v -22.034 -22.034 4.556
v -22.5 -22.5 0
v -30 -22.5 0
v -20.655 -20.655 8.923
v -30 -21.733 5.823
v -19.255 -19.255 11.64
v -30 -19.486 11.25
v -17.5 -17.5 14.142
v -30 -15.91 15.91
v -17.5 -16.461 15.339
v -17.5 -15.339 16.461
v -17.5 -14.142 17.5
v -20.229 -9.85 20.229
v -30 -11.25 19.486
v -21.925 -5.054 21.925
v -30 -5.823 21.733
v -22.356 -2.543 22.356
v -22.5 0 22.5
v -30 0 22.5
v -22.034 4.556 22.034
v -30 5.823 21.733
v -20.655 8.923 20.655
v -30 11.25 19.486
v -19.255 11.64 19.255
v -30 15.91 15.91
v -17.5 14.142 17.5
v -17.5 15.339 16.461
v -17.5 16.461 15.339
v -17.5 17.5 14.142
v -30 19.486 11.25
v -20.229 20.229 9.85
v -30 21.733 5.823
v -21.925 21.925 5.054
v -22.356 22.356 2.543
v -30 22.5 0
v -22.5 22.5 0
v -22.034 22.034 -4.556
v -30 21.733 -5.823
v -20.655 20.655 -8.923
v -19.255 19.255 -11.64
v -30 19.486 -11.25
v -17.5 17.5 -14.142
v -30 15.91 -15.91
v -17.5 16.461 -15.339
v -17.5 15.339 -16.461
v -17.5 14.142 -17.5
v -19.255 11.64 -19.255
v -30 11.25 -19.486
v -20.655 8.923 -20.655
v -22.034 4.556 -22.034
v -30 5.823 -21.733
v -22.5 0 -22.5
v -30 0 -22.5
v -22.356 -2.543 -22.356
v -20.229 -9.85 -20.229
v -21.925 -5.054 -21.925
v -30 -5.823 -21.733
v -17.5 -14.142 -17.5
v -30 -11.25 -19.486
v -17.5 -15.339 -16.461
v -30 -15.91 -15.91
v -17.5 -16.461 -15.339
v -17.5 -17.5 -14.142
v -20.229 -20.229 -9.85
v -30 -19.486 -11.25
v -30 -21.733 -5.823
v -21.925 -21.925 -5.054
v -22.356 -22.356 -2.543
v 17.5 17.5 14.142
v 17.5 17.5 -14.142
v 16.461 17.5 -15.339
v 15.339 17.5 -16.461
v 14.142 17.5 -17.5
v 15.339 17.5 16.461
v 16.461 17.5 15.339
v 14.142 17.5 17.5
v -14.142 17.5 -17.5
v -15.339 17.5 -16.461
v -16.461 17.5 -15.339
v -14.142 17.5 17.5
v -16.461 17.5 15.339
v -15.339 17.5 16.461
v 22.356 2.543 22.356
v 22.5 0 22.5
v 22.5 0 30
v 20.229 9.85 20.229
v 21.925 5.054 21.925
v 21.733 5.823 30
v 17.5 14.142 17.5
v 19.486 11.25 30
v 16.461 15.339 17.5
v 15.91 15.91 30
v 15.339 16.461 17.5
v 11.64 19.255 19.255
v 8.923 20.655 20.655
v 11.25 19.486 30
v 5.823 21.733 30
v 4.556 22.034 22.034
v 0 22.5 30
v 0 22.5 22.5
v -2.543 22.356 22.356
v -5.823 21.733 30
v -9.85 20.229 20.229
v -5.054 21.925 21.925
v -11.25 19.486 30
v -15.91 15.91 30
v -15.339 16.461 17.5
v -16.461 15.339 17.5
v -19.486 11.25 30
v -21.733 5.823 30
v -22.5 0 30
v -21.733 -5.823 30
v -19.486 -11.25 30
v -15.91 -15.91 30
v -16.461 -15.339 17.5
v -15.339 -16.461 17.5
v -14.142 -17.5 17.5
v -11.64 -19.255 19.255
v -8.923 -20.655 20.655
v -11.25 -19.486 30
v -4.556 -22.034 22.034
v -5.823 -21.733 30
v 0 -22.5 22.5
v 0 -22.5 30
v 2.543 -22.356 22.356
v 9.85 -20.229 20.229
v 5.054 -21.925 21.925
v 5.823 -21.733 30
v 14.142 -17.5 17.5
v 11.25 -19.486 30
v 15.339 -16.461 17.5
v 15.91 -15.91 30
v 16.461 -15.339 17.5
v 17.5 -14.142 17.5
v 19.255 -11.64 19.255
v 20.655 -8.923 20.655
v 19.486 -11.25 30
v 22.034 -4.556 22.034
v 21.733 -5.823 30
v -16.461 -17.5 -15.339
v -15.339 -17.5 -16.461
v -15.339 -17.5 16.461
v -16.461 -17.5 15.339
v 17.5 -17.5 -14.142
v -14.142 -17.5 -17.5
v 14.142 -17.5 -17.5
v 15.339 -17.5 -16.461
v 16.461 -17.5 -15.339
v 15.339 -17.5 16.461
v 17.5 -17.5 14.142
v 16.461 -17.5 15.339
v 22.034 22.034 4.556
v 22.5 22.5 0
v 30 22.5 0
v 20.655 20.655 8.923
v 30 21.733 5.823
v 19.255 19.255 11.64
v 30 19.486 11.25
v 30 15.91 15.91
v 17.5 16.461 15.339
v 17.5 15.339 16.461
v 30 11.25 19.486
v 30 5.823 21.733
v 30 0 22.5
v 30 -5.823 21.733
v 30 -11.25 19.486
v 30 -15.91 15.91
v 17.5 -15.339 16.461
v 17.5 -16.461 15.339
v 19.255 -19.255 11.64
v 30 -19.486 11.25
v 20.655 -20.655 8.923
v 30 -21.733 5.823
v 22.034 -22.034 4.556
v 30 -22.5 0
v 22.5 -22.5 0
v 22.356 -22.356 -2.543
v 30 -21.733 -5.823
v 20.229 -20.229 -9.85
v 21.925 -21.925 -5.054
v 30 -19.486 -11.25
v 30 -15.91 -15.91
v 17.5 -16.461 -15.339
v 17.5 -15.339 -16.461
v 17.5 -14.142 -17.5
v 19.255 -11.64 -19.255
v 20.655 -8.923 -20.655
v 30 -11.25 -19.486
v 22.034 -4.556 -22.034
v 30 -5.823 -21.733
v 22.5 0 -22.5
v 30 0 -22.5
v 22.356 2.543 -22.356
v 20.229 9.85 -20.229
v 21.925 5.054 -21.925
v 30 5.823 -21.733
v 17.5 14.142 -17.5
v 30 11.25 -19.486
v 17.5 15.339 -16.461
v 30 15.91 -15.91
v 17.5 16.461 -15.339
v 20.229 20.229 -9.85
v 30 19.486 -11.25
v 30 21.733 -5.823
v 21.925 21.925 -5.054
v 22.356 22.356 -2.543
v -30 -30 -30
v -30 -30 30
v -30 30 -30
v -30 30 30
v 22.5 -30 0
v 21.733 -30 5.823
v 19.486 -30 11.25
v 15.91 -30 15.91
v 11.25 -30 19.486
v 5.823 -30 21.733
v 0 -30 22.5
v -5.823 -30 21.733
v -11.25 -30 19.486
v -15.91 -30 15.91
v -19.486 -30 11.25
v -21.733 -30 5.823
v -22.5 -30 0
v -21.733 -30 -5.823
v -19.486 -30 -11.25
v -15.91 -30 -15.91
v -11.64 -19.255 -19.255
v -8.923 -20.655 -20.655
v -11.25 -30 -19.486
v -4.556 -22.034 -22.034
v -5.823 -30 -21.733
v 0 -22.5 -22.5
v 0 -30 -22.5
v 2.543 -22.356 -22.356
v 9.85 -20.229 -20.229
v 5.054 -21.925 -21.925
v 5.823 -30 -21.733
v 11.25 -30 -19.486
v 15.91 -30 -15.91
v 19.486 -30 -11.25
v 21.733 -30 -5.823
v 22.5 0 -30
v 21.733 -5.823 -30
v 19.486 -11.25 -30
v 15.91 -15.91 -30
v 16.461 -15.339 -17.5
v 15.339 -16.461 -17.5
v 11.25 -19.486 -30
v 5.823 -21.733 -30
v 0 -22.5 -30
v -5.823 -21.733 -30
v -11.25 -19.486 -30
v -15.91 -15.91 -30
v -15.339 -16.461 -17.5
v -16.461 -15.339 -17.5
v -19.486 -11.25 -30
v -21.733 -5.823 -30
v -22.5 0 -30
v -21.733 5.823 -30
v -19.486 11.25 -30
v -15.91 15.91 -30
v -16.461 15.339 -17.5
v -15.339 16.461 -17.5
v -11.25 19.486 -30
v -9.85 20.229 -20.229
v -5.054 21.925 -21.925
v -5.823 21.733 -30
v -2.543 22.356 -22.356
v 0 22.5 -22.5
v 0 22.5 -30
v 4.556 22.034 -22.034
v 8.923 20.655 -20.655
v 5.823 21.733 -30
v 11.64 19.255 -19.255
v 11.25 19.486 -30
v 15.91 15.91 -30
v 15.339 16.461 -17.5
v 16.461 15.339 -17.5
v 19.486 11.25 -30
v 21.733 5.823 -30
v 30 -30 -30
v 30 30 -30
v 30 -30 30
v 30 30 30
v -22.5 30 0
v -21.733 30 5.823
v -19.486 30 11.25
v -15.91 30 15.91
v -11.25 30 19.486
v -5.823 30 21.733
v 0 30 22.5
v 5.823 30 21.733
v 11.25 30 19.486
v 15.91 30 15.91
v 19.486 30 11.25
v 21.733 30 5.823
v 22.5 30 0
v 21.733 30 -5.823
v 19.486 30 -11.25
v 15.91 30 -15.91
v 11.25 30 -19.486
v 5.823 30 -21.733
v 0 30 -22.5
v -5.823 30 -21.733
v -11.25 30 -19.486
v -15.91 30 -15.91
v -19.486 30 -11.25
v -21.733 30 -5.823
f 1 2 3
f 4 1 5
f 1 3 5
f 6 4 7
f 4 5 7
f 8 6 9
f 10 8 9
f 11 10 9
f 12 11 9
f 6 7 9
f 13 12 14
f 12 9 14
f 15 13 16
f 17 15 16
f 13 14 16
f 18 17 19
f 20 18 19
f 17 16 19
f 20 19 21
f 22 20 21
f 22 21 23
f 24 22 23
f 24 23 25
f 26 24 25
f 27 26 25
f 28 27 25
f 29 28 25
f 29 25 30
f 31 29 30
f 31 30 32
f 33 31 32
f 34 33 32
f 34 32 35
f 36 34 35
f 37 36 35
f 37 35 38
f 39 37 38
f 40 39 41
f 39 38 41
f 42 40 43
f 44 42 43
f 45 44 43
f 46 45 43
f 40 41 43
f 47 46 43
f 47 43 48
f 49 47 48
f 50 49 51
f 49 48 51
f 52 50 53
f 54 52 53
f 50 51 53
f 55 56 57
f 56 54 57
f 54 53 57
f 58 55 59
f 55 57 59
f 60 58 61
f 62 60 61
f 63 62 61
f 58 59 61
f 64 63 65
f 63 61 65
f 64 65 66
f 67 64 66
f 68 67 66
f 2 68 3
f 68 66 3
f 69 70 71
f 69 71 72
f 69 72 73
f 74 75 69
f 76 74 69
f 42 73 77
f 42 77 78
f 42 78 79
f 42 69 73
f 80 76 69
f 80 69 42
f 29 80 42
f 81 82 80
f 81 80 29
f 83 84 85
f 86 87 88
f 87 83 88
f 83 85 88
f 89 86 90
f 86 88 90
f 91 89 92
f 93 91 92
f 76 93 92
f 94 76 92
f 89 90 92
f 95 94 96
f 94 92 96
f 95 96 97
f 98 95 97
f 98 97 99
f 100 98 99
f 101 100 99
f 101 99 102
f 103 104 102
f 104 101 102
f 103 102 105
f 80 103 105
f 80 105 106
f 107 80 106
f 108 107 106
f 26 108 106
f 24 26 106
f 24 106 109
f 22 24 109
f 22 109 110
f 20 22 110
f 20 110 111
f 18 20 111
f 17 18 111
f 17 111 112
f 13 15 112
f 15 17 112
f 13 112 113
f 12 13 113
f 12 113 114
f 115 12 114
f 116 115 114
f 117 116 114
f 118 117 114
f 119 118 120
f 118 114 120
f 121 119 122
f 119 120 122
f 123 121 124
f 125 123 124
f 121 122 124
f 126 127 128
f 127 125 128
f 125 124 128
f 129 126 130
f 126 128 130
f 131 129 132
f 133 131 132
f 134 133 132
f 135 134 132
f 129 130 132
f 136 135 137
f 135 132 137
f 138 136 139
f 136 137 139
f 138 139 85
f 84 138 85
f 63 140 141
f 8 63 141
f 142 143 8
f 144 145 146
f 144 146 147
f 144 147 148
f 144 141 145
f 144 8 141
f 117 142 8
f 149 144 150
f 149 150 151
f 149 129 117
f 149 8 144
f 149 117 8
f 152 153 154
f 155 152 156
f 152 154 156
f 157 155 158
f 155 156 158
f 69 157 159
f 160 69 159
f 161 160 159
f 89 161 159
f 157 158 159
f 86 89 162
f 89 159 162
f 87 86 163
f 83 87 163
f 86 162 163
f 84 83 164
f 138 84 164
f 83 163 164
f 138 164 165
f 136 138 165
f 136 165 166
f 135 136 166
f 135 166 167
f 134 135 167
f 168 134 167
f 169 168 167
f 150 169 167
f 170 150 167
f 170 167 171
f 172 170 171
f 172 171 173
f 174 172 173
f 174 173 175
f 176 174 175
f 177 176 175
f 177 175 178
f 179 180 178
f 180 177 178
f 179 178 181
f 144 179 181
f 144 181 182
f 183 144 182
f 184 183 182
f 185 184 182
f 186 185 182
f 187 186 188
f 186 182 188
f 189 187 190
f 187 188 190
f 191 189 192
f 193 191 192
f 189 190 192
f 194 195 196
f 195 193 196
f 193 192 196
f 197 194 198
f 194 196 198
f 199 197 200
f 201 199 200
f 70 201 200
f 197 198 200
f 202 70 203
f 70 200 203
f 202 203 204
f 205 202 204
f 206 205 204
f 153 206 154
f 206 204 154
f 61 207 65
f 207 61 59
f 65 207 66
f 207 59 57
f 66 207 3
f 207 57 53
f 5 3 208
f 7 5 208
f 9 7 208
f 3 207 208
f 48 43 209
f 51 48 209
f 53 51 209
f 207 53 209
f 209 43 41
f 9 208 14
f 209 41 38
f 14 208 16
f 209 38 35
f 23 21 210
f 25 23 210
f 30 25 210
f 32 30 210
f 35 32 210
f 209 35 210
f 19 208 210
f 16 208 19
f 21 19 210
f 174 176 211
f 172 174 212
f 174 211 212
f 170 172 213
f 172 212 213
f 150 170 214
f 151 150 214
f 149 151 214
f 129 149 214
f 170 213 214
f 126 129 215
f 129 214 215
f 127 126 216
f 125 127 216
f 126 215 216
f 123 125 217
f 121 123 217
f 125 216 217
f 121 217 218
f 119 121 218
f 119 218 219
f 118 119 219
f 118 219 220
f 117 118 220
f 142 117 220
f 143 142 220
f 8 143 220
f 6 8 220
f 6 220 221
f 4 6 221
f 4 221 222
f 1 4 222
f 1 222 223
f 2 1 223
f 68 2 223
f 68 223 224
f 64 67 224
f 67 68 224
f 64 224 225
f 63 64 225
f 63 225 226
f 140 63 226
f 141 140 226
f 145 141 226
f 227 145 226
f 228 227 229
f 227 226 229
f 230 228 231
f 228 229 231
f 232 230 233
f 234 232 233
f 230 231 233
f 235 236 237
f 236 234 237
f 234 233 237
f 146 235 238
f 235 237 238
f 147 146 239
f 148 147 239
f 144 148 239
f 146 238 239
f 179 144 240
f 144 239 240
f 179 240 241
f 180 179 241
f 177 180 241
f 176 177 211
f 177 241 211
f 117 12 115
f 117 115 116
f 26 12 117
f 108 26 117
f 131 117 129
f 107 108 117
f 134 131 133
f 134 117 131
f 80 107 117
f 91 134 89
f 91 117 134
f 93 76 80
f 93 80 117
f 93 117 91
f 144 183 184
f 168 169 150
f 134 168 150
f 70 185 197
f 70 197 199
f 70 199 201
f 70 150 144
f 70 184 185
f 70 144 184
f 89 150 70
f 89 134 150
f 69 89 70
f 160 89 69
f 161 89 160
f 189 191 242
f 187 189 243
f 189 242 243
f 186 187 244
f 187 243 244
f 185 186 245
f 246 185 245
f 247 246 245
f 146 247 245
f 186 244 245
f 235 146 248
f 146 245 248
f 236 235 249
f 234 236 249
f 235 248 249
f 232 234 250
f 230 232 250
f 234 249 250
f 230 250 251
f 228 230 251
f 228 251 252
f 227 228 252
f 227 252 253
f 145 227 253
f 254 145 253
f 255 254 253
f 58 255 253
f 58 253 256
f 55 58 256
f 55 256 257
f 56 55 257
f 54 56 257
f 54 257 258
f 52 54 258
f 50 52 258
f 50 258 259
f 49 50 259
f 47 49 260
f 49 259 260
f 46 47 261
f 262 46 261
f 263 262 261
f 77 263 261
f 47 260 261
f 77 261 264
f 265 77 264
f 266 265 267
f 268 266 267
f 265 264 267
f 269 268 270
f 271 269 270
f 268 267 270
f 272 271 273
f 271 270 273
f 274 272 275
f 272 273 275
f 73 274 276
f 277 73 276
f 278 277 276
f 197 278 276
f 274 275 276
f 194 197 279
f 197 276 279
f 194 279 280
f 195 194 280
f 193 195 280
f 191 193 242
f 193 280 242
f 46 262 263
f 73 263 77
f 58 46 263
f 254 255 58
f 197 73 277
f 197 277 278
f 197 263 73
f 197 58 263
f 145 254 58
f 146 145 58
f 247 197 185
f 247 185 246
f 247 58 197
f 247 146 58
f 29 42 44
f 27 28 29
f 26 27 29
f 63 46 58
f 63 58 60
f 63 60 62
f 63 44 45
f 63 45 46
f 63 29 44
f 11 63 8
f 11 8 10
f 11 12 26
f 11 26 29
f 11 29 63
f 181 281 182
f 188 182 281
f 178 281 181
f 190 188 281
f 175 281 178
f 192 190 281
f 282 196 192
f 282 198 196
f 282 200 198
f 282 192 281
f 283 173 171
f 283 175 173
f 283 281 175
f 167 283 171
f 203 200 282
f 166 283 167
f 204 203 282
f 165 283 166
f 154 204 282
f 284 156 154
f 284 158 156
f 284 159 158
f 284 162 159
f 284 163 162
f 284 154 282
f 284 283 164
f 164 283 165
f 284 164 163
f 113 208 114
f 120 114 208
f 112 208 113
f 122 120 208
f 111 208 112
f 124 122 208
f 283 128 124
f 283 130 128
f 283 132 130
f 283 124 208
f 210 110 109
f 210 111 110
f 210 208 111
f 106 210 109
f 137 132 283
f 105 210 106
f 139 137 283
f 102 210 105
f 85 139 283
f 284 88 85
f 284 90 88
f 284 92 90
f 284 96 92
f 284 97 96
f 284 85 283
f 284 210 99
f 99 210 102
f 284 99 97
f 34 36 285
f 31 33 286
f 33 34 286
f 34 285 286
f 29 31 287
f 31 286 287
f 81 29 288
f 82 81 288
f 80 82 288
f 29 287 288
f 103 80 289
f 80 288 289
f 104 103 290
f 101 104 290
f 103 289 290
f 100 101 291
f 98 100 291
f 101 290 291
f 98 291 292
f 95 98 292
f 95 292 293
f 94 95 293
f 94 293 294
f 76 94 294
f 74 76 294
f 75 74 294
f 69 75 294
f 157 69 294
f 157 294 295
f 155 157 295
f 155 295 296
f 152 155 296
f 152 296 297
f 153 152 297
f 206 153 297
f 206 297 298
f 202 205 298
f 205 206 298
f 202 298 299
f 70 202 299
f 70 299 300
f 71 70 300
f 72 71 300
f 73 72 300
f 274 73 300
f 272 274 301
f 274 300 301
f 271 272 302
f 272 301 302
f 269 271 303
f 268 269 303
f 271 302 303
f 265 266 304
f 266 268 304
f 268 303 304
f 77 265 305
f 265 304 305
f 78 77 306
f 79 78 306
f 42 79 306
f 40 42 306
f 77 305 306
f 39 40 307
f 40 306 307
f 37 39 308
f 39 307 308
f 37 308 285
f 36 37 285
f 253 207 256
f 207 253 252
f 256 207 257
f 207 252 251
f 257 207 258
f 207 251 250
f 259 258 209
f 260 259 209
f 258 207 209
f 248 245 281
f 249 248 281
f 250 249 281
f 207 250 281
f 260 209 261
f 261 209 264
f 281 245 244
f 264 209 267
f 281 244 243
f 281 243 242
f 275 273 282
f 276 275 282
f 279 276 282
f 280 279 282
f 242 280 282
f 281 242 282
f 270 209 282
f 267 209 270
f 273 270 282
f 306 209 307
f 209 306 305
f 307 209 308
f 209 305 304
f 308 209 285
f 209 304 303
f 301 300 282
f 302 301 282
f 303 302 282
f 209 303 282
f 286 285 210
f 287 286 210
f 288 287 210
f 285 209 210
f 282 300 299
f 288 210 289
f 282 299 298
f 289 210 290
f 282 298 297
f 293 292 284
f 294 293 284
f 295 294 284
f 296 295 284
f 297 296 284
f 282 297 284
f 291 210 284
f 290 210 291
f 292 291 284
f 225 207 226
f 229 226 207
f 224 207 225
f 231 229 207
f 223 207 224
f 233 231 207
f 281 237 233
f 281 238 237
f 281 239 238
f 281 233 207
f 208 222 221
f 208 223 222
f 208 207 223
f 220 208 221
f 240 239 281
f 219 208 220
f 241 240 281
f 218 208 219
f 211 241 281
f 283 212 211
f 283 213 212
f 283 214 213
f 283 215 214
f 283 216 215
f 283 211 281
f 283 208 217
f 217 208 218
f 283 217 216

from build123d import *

# Parameters (mm, degrees)
F2_W          = 60
F2_H          = 60
F3_DEPTH      = 30
F3_DEPTH_BACK = 30
F9_R          = 22.5
F10_DEPTH     = 12.5
F6_R          = 22.5
F11_DEPTH     = 12.5
F5_R          = 22.5
F12_DEPTH     = 12.5
F8_R          = 22.5
F13_DEPTH     = 12.5
F7_R          = 22.5
F14_DEPTH     = 12.5
F4_R          = 22.5
F15_DEPTH     = 12.5


with BuildPart() as f3:
    # F2 (on Top) → F3 (new body, two sides)
    with BuildSketch(Plane.XY) as f3_sk:
        Rectangle(F2_W, F2_H)
    extrude(amount=F3_DEPTH)
    extrude(f3_sk.sketch, amount=-F3_DEPTH_BACK)

    # F9 (on face) → F10 (cut)
    with BuildSketch(Plane(origin=(0, 0, -30), x_dir=(1, 0, 0), z_dir=(0, 0, -1))):
        Circle(F9_R)
    extrude(amount=-F10_DEPTH, mode=Mode.SUBTRACT)

    # F6 (on face) → F11 (cut)
    with BuildSketch(Plane(origin=(-30, 0, 0), x_dir=(0, -1, 0), z_dir=(-1, 0, 0))):
        Circle(F6_R)
    extrude(amount=-F11_DEPTH, mode=Mode.SUBTRACT)

    # F5 (on face) → F12 (cut)
    with BuildSketch(Plane.XZ.offset(30)):
        Circle(F5_R)
    extrude(amount=-F12_DEPTH, mode=Mode.SUBTRACT)

    # F8 (on face) → F13 (cut)
    with BuildSketch(Plane.YZ.offset(30)):
        Circle(F8_R)
    extrude(amount=-F13_DEPTH, mode=Mode.SUBTRACT)

    # F7 (on face) → F14 (cut)
    with BuildSketch(Plane(origin=(0, 30, 0), x_dir=(-1, 0, 0), z_dir=(0, 1, 0))):
        Circle(F7_R)
    extrude(amount=-F14_DEPTH, mode=Mode.SUBTRACT)

    # F4 (on face) → F15 (cut)
    with BuildSketch(Plane.XY.offset(30)):
        Circle(F4_R)
    extrude(amount=-F15_DEPTH, mode=Mode.SUBTRACT)


solid = f3.part
